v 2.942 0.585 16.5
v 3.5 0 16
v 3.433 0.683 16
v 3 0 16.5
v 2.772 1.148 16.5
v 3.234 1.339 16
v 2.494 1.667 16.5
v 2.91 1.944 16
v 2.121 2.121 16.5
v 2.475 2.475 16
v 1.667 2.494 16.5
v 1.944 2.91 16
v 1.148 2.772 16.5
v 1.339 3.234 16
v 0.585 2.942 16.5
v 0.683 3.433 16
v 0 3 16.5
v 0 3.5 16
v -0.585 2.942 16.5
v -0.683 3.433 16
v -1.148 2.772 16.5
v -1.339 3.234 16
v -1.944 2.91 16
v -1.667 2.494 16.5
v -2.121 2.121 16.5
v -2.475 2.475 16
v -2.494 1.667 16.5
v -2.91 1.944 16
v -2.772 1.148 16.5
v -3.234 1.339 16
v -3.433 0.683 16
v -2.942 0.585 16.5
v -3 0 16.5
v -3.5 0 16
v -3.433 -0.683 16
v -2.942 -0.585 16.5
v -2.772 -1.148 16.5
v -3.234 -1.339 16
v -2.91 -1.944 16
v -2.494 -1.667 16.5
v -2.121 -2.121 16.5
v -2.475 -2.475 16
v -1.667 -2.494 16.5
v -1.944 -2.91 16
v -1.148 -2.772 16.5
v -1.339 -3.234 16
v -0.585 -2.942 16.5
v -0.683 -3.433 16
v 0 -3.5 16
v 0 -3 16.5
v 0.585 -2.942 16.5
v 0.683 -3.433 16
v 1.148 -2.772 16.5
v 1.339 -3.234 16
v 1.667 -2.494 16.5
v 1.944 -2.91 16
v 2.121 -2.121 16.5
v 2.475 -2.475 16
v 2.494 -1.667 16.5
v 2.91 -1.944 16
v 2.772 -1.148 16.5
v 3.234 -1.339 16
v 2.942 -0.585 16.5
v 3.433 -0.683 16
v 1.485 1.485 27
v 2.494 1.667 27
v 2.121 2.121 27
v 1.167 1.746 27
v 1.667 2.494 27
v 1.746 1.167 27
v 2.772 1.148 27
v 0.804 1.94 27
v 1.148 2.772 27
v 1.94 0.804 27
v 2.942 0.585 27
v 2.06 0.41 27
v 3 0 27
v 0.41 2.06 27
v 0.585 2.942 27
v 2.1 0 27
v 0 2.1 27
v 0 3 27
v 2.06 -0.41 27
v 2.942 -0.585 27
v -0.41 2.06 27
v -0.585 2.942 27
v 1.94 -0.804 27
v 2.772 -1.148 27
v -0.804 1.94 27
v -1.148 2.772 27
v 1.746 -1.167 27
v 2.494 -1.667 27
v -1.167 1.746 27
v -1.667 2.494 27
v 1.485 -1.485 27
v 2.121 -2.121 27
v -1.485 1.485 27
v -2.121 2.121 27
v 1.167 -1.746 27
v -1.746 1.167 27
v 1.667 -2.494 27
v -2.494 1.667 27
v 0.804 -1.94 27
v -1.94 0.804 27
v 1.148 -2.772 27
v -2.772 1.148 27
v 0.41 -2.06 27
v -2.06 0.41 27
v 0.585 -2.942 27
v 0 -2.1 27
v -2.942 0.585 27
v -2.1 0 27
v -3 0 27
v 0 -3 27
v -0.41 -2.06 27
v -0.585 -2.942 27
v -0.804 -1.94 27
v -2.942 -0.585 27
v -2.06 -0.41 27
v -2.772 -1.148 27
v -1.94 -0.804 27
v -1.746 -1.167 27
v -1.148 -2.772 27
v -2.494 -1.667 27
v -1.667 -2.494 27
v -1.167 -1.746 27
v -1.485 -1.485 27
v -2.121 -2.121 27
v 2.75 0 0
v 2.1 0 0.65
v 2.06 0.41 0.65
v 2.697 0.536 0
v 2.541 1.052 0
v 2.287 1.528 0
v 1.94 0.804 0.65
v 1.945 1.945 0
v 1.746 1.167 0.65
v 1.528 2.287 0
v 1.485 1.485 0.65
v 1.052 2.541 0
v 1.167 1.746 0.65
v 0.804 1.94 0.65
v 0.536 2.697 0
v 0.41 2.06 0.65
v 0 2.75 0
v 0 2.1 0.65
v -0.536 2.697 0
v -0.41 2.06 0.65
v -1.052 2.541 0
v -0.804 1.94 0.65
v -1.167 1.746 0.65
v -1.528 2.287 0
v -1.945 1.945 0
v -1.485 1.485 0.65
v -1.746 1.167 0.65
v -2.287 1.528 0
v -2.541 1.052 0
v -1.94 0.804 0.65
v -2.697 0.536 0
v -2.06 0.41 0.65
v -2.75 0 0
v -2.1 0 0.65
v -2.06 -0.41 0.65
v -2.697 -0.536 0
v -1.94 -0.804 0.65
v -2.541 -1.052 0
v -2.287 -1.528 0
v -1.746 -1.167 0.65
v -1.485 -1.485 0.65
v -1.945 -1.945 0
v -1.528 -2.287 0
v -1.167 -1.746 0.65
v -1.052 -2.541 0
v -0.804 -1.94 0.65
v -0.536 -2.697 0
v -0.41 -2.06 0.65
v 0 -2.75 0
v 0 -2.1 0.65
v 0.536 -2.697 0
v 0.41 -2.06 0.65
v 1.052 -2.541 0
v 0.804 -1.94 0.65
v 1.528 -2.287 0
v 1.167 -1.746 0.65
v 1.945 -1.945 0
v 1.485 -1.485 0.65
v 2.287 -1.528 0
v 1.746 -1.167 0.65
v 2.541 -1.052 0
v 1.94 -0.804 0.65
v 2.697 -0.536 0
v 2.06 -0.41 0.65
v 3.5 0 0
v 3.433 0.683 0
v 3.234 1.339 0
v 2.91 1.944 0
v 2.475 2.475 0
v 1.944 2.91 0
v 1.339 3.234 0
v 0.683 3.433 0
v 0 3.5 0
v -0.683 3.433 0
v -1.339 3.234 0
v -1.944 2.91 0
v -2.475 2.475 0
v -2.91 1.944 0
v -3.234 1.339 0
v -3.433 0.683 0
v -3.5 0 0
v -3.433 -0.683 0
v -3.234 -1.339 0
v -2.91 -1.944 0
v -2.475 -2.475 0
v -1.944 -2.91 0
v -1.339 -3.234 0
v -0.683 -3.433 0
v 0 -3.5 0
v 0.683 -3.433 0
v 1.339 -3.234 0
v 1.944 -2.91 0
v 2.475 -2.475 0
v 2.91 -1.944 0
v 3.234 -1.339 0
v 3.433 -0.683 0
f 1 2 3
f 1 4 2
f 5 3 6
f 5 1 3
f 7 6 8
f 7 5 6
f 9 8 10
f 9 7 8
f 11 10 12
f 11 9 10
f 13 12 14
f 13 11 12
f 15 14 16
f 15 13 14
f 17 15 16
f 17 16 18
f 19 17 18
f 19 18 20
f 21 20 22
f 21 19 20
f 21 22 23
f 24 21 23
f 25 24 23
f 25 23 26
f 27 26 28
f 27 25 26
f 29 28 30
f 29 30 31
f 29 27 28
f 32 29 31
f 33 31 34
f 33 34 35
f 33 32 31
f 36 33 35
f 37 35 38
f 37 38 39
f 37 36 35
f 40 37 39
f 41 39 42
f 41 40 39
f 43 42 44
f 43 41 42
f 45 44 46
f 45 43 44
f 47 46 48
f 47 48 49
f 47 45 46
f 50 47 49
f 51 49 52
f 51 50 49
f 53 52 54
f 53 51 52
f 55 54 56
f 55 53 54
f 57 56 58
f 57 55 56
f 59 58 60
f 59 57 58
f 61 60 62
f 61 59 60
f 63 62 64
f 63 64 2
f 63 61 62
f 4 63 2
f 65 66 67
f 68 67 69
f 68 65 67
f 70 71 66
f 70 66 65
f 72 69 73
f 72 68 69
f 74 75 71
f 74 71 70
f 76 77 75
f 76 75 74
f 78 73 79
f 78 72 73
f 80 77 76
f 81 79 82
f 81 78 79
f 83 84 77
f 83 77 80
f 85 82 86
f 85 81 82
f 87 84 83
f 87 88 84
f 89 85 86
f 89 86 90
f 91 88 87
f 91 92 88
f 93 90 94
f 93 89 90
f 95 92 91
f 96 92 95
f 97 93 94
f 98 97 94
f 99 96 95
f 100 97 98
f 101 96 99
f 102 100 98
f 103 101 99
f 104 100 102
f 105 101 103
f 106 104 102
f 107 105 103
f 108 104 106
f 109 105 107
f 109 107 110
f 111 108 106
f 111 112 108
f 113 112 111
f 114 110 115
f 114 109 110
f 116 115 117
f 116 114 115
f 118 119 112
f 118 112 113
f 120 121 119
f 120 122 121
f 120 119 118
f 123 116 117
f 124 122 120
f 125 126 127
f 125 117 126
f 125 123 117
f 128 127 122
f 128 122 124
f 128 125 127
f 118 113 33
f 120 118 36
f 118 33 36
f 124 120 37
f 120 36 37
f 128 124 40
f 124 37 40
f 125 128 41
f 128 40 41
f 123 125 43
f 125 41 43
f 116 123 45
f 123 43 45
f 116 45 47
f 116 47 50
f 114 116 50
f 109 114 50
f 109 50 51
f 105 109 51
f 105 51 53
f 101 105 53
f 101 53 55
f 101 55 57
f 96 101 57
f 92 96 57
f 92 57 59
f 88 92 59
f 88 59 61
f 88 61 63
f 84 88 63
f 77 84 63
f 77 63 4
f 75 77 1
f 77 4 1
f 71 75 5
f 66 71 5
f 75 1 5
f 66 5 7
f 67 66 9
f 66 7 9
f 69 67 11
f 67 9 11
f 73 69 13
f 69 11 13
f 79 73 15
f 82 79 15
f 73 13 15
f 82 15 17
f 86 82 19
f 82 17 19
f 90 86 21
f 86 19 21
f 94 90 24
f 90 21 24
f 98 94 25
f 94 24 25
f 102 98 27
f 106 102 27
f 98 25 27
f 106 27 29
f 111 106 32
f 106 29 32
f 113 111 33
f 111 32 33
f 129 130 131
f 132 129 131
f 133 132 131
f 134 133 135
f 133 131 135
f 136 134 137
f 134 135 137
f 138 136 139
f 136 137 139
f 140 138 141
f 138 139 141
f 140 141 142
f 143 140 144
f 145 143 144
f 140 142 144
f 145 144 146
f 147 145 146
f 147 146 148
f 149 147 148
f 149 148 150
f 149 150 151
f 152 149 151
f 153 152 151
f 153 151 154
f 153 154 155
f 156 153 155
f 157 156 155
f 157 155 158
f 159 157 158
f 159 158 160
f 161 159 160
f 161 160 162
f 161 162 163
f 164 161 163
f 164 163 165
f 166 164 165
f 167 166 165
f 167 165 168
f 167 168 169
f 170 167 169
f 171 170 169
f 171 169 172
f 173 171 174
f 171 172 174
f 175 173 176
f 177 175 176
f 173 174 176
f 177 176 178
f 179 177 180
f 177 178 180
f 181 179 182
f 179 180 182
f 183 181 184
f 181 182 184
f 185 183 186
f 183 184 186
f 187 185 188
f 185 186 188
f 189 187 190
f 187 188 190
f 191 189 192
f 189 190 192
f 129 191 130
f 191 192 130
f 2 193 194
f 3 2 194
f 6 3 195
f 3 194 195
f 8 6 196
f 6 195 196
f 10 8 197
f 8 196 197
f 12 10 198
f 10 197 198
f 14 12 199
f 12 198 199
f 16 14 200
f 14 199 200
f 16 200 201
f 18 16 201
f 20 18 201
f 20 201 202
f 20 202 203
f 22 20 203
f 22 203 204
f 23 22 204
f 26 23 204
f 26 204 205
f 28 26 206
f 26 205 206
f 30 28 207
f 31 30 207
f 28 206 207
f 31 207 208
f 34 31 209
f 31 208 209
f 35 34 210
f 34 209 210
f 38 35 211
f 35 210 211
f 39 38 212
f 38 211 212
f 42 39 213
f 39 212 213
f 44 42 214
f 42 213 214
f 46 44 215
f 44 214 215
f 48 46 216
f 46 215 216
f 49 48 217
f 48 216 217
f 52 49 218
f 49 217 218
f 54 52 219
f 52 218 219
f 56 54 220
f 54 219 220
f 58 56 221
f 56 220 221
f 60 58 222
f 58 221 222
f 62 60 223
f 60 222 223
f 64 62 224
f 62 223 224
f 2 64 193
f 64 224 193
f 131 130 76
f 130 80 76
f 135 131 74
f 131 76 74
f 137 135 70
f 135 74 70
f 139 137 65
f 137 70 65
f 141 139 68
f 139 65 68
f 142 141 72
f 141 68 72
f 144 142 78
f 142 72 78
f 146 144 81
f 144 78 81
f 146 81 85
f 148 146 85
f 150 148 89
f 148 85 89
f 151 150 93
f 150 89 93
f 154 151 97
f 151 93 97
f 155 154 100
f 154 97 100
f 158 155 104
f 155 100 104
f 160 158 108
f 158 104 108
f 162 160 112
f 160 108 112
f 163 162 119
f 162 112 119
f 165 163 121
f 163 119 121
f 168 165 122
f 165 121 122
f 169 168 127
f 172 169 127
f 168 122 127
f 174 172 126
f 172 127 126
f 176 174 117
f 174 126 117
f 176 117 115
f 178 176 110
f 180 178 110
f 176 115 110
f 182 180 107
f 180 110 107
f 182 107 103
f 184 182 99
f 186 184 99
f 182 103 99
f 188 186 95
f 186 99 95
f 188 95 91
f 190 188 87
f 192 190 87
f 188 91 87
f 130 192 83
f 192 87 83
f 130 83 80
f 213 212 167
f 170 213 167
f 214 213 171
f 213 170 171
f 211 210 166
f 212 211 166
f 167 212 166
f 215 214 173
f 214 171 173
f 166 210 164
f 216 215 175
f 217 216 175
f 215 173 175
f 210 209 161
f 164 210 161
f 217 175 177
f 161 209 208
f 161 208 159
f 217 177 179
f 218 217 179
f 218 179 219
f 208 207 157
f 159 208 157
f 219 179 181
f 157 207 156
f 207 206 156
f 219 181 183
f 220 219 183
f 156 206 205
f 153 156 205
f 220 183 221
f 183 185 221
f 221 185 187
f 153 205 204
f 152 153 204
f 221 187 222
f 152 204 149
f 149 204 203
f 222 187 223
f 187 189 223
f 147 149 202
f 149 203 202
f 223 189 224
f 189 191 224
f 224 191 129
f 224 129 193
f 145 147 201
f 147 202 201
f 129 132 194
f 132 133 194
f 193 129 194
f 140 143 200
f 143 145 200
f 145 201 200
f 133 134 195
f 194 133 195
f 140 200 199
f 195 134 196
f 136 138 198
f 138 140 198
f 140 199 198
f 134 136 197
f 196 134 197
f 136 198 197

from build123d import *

# Parameters (mm, degrees)
SKETCH1_R                                       = 3.5
BOSS_EXTRUDE1_DEPTH                             = 16.5
CHAMFER1_SIZE                                   = 0.5
SKETCH2_R                                       = 3
BOSS_EXTRUDE2_DEPTH                             = 10.5
CSK_FOR_M4_FLAT_HEAD_MACHINE_SCREW1_D           = 4.2
CSK_FOR_M4_FLAT_HEAD_MACHINE_SCREW1_CSINK_D     = 5.5
CSK_FOR_M4_FLAT_HEAD_MACHINE_SCREW1_CSINK_ANGLE = 90


with BuildPart() as part:
    # Sketch1 → Boss-Extrude1 (new body)
    with BuildSketch(Plane.XY):
        Circle(SKETCH1_R)
    extrude(amount=BOSS_EXTRUDE1_DEPTH)

    # Chamfer1
    chamfer1_edges = [part.edges().sort_by_distance(p)[0] for p in [
        (-3.5, 0, 16.5),
    ]]
    chamfer(chamfer1_edges, length=CHAMFER1_SIZE)

    # Sketch2 → Boss-Extrude2 (add)
    with BuildSketch(Plane.XY.offset(16.5)):
        with Locations(Location((0, 0, 0), (0, 0, 180))):
            Circle(SKETCH2_R)
    extrude(amount=BOSS_EXTRUDE2_DEPTH)

    # CSK for M4 Flat Head Machine Screw1 (through all)
    with Locations(Plane(origin=(0, 0, 0), x_dir=(-1, 0, 0), z_dir=(0, 0, -1))):
        with Locations((0, 0)):
            CounterSinkHole(CSK_FOR_M4_FLAT_HEAD_MACHINE_SCREW1_D / 2, CSK_FOR_M4_FLAT_HEAD_MACHINE_SCREW1_CSINK_D / 2, counter_sink_angle=CSK_FOR_M4_FLAT_HEAD_MACHINE_SCREW1_CSINK_ANGLE)


solid = part.part
